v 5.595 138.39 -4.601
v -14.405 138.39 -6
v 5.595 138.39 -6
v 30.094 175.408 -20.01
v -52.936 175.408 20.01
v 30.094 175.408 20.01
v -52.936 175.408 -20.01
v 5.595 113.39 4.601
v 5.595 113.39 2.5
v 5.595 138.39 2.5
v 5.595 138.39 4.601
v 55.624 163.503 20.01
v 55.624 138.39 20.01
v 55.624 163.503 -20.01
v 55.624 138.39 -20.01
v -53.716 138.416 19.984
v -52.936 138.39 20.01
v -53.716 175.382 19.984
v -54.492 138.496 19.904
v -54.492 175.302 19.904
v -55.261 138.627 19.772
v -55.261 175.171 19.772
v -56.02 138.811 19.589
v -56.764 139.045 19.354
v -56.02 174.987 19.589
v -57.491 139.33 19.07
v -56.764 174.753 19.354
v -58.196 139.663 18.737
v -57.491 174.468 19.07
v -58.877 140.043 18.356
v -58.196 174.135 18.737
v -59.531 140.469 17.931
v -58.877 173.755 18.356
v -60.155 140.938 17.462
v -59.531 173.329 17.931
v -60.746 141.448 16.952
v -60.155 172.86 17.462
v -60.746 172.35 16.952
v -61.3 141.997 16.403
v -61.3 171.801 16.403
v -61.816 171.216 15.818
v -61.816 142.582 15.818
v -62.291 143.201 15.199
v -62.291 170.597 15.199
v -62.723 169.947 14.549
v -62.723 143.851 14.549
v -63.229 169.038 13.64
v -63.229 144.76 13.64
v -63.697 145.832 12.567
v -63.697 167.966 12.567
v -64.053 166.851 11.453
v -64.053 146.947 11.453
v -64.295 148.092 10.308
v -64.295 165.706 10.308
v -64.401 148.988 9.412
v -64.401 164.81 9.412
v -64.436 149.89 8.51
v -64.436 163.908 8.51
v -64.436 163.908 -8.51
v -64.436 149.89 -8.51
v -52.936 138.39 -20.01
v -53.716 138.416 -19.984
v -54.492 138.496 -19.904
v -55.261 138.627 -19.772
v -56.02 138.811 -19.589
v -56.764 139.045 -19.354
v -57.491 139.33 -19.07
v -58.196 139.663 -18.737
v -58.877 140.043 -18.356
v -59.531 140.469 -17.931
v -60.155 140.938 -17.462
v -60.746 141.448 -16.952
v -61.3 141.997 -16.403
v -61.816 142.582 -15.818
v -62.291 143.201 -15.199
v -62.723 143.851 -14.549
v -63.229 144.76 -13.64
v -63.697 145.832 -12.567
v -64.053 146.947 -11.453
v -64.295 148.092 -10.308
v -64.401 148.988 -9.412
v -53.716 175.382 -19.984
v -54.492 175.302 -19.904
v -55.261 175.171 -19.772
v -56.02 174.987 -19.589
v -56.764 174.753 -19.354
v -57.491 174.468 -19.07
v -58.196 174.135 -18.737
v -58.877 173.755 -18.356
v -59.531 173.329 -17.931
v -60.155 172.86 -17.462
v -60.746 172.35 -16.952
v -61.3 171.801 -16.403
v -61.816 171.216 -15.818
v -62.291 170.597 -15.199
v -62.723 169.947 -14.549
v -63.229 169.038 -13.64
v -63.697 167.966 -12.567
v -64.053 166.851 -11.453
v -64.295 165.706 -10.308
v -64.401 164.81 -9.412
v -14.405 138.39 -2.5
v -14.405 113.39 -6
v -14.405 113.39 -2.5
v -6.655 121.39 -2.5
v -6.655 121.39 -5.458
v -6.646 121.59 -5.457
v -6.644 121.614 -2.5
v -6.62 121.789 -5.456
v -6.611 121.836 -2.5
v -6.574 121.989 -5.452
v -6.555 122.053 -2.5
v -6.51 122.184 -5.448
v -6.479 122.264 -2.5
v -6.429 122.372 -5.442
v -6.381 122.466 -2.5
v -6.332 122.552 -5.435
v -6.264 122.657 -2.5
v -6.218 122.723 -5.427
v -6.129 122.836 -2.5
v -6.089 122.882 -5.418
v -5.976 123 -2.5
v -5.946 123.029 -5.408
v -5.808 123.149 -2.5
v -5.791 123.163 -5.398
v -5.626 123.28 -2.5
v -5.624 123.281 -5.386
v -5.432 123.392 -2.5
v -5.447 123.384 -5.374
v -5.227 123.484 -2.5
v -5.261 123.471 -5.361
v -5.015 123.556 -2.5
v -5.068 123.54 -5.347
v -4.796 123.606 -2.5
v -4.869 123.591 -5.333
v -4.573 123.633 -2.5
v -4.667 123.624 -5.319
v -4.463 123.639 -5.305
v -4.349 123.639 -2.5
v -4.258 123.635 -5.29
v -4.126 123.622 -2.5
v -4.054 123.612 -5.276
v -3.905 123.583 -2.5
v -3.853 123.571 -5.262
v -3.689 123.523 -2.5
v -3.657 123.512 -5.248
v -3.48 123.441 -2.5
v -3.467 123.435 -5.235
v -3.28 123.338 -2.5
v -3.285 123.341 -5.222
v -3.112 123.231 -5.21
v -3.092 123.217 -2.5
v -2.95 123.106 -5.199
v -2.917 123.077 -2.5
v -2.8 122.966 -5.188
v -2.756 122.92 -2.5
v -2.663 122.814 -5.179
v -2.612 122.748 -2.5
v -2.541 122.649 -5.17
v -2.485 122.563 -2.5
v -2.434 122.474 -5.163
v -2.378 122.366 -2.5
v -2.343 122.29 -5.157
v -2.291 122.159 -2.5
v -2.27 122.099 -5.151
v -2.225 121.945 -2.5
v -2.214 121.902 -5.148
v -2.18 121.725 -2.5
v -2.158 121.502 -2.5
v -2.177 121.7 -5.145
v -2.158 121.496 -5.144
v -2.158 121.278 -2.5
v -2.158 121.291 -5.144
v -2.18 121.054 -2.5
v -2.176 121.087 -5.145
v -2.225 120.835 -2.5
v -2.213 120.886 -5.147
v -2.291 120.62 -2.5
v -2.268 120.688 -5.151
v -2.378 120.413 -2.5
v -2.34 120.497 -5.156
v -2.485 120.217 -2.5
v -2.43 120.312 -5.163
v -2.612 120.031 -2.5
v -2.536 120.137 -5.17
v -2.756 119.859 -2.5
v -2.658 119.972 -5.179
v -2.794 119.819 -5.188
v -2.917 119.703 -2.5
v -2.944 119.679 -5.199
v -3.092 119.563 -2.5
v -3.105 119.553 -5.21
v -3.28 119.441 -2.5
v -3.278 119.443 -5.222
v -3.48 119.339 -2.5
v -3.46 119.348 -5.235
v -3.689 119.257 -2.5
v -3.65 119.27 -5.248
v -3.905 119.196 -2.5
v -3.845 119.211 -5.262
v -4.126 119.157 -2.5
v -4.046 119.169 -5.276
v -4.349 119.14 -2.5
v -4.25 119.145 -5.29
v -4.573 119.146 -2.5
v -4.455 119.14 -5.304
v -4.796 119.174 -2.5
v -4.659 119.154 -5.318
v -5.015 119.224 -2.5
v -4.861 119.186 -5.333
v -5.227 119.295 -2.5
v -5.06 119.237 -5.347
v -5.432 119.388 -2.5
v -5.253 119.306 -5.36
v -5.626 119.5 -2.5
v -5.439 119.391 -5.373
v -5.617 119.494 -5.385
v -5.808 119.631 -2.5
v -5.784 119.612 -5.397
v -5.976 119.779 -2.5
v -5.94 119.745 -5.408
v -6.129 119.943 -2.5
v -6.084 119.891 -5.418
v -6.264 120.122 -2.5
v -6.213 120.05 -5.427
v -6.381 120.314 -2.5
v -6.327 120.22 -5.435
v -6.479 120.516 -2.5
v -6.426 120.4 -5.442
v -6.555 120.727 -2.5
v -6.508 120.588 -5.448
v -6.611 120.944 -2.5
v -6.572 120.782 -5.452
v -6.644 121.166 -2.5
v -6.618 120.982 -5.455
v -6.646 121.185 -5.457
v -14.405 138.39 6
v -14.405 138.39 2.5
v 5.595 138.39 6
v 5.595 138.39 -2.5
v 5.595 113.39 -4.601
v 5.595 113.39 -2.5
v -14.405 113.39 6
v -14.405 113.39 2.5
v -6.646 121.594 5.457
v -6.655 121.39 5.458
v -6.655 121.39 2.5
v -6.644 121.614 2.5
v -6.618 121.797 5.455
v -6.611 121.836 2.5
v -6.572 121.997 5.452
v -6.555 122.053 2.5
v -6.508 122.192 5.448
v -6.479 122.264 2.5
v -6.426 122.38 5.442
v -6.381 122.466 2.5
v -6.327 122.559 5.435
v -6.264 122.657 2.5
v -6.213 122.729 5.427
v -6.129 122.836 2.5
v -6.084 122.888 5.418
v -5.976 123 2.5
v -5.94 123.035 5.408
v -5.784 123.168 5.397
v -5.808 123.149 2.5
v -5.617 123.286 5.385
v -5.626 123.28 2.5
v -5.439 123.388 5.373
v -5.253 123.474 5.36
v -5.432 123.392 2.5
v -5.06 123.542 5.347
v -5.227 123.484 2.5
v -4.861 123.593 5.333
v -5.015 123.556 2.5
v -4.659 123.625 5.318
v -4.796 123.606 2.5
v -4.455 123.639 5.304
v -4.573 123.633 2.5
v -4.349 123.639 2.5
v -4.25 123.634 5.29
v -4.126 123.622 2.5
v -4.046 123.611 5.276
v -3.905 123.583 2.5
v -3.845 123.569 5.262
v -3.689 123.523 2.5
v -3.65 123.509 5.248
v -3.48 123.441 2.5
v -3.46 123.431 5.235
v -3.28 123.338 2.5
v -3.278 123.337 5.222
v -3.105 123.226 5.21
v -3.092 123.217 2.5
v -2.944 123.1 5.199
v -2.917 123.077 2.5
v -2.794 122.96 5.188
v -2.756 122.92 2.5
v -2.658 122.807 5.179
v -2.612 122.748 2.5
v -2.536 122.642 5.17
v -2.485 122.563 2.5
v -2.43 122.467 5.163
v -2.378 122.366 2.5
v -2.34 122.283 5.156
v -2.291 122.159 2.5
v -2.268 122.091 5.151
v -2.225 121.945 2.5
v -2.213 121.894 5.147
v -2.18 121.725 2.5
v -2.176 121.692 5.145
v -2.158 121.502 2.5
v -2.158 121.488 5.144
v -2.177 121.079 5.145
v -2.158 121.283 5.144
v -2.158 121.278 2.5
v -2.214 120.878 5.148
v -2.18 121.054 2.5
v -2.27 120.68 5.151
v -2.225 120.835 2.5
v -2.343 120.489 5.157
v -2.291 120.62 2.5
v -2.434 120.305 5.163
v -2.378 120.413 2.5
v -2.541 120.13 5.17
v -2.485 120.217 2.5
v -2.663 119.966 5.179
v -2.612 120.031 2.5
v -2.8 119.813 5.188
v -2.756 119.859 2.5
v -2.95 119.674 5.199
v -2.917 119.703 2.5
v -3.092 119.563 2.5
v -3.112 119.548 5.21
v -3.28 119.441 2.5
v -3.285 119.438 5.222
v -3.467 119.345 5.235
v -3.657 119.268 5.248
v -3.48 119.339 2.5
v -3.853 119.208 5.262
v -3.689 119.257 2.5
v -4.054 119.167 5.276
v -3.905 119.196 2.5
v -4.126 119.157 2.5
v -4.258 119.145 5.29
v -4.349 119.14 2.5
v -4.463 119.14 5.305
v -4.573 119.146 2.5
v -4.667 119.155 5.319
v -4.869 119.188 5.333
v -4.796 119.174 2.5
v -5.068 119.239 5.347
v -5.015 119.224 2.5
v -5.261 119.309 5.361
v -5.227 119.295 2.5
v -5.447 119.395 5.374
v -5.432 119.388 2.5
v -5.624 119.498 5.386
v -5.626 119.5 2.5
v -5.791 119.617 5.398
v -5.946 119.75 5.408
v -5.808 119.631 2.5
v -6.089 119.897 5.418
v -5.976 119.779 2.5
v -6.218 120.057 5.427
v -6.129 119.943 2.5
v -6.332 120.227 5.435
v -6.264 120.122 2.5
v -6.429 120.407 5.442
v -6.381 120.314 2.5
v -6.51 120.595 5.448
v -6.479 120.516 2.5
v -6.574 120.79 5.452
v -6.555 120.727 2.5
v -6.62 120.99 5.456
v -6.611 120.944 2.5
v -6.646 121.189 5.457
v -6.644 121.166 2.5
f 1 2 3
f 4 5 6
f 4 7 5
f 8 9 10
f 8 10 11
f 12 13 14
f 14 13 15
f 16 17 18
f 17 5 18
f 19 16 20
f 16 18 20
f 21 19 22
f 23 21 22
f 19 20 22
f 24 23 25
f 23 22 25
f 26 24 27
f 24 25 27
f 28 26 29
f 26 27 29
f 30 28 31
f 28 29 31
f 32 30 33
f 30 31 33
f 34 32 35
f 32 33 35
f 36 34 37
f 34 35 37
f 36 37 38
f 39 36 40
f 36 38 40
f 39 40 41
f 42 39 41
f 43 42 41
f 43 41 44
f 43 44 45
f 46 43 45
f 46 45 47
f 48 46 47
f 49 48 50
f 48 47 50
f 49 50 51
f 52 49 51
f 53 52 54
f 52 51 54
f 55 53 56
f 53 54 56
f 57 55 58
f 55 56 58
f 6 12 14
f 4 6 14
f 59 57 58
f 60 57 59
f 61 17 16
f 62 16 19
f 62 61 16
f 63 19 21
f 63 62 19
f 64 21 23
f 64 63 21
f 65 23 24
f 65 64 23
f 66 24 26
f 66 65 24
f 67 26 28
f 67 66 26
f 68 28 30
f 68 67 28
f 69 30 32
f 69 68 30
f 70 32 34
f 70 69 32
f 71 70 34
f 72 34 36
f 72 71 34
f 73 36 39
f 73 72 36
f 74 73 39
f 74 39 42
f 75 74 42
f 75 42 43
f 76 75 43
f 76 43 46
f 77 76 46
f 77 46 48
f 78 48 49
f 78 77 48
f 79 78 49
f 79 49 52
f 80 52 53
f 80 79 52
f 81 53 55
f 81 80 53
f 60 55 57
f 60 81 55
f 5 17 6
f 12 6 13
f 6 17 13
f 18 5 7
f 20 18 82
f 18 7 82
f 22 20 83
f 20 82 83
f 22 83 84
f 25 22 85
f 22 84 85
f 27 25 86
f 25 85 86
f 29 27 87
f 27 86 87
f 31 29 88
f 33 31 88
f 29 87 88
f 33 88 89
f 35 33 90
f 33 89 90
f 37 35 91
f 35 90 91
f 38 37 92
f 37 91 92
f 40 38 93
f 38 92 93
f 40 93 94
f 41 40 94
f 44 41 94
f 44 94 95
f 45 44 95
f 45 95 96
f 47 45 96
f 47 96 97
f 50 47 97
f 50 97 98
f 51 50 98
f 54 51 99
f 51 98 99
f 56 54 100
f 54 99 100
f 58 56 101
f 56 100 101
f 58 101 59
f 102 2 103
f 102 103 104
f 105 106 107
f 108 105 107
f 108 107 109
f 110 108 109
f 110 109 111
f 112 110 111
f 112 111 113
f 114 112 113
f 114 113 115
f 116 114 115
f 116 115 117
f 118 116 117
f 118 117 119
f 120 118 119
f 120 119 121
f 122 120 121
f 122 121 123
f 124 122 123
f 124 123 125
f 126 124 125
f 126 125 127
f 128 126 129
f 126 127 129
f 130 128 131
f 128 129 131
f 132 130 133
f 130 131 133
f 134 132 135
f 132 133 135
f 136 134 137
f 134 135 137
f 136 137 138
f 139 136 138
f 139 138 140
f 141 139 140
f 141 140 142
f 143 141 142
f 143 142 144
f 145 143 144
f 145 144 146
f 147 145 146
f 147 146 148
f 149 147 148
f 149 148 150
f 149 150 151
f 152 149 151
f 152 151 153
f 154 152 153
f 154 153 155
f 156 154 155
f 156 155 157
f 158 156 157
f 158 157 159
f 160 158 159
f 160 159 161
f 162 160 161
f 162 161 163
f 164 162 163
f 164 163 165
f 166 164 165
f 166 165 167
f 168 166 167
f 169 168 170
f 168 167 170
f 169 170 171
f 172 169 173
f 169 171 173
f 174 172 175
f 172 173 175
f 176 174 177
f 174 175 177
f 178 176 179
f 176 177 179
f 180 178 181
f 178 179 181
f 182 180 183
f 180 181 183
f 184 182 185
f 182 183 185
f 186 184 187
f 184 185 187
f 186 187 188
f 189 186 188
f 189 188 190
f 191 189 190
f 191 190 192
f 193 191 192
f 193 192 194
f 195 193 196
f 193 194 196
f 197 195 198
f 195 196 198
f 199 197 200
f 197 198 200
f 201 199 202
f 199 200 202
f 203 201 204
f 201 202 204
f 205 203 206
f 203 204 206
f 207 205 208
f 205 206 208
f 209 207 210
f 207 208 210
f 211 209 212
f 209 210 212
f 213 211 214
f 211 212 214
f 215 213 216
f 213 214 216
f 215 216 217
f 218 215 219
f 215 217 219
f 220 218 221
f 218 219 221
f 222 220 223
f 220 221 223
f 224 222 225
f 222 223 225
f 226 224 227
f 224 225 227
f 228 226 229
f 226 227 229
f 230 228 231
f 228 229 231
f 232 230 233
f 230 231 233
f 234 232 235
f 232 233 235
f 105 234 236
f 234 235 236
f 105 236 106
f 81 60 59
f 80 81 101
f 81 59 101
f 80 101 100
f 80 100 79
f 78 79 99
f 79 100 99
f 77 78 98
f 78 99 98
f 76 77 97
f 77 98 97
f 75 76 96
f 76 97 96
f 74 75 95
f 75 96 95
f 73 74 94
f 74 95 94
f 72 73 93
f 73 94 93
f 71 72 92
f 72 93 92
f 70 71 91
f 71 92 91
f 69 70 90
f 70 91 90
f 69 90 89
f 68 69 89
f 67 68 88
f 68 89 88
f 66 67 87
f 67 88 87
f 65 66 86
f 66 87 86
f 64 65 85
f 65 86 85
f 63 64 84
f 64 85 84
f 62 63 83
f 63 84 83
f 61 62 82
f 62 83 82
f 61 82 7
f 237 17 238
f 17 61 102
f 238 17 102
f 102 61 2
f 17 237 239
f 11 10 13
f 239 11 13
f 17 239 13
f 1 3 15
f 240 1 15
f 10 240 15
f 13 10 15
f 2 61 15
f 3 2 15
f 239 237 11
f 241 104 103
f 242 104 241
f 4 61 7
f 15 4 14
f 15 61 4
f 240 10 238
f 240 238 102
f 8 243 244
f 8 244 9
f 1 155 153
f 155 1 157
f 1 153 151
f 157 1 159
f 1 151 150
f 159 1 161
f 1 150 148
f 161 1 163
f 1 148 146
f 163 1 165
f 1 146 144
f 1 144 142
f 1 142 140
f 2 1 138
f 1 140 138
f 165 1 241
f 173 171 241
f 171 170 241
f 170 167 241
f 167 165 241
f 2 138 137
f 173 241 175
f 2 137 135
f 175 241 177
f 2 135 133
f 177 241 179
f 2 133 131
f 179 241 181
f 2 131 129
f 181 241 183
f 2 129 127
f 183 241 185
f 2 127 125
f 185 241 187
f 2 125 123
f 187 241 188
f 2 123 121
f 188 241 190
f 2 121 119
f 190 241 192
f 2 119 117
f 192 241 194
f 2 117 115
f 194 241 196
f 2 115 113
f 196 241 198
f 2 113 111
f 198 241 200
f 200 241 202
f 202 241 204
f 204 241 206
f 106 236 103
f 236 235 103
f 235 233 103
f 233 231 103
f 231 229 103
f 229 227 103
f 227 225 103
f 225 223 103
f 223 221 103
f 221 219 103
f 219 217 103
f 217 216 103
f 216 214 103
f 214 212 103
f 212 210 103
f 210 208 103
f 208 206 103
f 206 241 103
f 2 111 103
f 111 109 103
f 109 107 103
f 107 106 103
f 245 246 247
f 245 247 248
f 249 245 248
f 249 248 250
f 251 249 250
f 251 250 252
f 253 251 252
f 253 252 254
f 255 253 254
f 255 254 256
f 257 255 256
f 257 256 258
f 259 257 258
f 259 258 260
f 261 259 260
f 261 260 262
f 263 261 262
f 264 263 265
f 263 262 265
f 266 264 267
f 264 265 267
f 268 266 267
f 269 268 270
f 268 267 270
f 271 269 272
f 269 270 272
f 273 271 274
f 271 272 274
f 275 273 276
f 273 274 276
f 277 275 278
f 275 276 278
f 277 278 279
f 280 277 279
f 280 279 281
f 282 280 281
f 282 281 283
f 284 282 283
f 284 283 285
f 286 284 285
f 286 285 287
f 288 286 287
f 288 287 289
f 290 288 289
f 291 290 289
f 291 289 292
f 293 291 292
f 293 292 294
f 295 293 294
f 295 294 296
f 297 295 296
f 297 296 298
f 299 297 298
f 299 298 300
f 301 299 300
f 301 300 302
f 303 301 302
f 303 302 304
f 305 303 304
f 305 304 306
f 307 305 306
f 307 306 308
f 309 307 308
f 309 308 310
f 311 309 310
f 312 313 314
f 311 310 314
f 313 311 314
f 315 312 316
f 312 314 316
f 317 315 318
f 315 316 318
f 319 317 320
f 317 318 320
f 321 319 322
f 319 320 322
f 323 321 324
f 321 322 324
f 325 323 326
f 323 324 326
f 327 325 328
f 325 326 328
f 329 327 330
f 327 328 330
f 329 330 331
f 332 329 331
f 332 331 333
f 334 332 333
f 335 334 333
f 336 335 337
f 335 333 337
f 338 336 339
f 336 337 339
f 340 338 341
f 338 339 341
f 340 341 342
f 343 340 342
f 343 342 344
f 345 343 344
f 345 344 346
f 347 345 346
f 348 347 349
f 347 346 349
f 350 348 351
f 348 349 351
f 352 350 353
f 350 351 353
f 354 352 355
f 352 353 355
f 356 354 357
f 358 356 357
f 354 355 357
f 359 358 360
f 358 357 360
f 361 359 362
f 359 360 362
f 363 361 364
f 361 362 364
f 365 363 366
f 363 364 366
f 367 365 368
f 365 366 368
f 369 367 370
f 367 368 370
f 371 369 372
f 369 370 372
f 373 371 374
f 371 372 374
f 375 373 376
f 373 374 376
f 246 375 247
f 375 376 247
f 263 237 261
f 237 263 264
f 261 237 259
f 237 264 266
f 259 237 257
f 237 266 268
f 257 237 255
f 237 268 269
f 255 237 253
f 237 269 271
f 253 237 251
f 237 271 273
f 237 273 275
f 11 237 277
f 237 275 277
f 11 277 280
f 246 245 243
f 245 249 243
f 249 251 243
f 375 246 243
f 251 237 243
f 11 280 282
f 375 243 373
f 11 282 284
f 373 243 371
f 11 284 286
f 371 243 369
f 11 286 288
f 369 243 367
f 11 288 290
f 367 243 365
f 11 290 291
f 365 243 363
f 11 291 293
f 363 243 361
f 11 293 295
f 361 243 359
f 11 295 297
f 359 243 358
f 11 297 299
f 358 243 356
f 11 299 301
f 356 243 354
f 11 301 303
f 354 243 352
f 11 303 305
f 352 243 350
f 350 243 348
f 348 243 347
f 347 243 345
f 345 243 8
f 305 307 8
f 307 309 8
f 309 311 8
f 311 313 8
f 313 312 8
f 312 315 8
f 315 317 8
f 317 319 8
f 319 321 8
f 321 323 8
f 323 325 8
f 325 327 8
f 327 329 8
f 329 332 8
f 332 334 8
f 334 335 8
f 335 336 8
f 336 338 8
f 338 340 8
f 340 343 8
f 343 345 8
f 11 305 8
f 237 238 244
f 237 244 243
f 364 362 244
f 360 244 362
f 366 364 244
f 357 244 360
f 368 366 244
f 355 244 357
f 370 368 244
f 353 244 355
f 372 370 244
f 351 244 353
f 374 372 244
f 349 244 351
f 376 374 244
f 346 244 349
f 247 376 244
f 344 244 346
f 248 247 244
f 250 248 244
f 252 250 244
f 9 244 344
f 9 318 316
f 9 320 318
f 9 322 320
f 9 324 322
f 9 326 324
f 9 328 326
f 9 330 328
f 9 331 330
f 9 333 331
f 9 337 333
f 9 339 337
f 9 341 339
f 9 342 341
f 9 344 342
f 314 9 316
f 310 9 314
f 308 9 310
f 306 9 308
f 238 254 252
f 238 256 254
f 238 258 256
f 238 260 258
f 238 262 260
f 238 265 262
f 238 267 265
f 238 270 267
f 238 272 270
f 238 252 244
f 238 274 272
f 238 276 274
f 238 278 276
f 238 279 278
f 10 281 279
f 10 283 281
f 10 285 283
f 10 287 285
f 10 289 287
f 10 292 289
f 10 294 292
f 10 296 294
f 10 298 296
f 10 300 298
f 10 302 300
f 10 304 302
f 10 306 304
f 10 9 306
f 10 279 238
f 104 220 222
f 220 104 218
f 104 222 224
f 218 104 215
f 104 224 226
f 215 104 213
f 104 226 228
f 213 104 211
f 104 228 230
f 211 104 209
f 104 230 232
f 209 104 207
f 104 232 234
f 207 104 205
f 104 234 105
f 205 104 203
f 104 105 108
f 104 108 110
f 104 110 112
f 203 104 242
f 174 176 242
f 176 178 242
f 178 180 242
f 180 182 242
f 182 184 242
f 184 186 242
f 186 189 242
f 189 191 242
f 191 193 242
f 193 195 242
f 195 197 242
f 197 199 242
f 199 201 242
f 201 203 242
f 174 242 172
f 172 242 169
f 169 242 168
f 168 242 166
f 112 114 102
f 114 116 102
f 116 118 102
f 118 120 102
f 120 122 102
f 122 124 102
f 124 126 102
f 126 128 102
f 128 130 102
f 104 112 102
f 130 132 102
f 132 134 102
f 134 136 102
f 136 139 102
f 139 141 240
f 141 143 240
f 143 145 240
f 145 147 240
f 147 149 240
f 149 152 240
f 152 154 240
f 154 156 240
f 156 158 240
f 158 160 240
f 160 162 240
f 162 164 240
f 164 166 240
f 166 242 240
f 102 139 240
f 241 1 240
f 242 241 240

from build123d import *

# Parameters (mm, degrees)
SKETCH1_W            = 1044
SKETCH1_H            = 348
BOSS_EXTRUDE1_DEPTH  = 321.9
CHAMFER2_SIZE        = 222
CHAMFER2_SIZE2       = 103.52030011
FILLET1_R            = 100
SCALE1_SCALE         = 0.115
SKETCH175_W          = 20
SKETCH175_H          = 12
BOSS_EXTRUDE12_DEPTH = 25
SKETCH176_W          = 5
SKETCH176_H          = 25
CUT_EXTRUDE1_DEPTH   = 30
SKETCH177_R          = 2.25
CUT_EXTRUDE2_DEPTH   = 30
CUT_EXTRUDE4_DEPTH   = 25


with BuildPart() as part:
    # Sketch1 → Boss-Extrude1 (new body)
    with BuildSketch(Plane(origin=(0, 0, 0), x_dir=(1, 0, 0), z_dir=(0, 1, 0))):
        Rectangle(SKETCH1_W, SKETCH1_H)
    extrude(amount=BOSS_EXTRUDE1_DEPTH)

    # Chamfer2
    chamfer2_edges = [part.edges().sort_by_distance(p)[0] for p in [
        (522, 321.9, 0),
    ]]
    chamfer2_side = [part.faces().sort_by_distance(p)[0] for p in [
        (0, 321.9, 0),
    ]]
    chamfer(chamfer2_edges, length=CHAMFER2_SIZE, length2=CHAMFER2_SIZE2, reference=chamfer2_side[0])

    # Fillet1
    fillet1_edges = [part.edges().sort_by_distance(p)[0] for p in [
        (-522, 321.9, 0),
        (-522, 0, 0),
        (-522, 160.95, -174),
        (-522, 160.95, 174),
    ]]
    fillet(fillet1_edges, radius=FILLET1_R)


with BuildPart() as part_1:
    # Scale1: scaled about (-4.978902211, 156.372589253, 0)
    add(part.part.scale(SCALE1_SCALE).moved(Location((-4.406328457, 138.389741489, 0))))


with BuildPart() as boss_extrude12_tool:
    # Sketch175 → Boss-Extrude12 (new body)
    with BuildSketch(Plane.XZ.offset(-138.389734505)):
        with Locations((-4.405349795, 0)):
            Rectangle(SKETCH175_W, SKETCH175_H)
    extrude(amount=BOSS_EXTRUDE12_DEPTH)


with BuildPart() as part_2:
    add(part_1.part)


with BuildPart() as part_3:
    # Boss-Extrude12: joined with boss_extrude12_tool
    add(part_2.part.fuse(boss_extrude12_tool.part, tol=0.00001))

    # Sketch176 → Cut-Extrude1 (cut)
    with BuildSketch(Plane(origin=(5.594650205, 0, 0), x_dir=(0, 0, -1), z_dir=(1, 0, 0))):
        with Locations((0, 125.889734505)):
            Rectangle(SKETCH176_W, SKETCH176_H)
    extrude(amount=-CUT_EXTRUDE1_DEPTH, mode=Mode.SUBTRACT)

    # Sketch177 → Cut-Extrude2 (cut)
    with BuildSketch(Plane(origin=(0, 0, -6), x_dir=(-1, 0, 0), z_dir=(0, 0, -1))):
        with Locations((4.405349795, 121.389734505)):
            Circle(SKETCH177_R)
    extrude(amount=-CUT_EXTRUDE2_DEPTH, mode=Mode.SUBTRACT)

    # Sketch179 → Cut-Extrude4 (cut)
    with BuildSketch(Plane.XZ.offset(-113.389734505)):
        Polygon((-14.405349795, 6), (20.594650205, 3.552561582), (20.594650205, -3.552561582), (-14.405349795, -6), (23.594650205, -6), (23.594650205, 6), align=None)
    extrude(amount=-CUT_EXTRUDE4_DEPTH, mode=Mode.SUBTRACT)


solid = part_3.part
